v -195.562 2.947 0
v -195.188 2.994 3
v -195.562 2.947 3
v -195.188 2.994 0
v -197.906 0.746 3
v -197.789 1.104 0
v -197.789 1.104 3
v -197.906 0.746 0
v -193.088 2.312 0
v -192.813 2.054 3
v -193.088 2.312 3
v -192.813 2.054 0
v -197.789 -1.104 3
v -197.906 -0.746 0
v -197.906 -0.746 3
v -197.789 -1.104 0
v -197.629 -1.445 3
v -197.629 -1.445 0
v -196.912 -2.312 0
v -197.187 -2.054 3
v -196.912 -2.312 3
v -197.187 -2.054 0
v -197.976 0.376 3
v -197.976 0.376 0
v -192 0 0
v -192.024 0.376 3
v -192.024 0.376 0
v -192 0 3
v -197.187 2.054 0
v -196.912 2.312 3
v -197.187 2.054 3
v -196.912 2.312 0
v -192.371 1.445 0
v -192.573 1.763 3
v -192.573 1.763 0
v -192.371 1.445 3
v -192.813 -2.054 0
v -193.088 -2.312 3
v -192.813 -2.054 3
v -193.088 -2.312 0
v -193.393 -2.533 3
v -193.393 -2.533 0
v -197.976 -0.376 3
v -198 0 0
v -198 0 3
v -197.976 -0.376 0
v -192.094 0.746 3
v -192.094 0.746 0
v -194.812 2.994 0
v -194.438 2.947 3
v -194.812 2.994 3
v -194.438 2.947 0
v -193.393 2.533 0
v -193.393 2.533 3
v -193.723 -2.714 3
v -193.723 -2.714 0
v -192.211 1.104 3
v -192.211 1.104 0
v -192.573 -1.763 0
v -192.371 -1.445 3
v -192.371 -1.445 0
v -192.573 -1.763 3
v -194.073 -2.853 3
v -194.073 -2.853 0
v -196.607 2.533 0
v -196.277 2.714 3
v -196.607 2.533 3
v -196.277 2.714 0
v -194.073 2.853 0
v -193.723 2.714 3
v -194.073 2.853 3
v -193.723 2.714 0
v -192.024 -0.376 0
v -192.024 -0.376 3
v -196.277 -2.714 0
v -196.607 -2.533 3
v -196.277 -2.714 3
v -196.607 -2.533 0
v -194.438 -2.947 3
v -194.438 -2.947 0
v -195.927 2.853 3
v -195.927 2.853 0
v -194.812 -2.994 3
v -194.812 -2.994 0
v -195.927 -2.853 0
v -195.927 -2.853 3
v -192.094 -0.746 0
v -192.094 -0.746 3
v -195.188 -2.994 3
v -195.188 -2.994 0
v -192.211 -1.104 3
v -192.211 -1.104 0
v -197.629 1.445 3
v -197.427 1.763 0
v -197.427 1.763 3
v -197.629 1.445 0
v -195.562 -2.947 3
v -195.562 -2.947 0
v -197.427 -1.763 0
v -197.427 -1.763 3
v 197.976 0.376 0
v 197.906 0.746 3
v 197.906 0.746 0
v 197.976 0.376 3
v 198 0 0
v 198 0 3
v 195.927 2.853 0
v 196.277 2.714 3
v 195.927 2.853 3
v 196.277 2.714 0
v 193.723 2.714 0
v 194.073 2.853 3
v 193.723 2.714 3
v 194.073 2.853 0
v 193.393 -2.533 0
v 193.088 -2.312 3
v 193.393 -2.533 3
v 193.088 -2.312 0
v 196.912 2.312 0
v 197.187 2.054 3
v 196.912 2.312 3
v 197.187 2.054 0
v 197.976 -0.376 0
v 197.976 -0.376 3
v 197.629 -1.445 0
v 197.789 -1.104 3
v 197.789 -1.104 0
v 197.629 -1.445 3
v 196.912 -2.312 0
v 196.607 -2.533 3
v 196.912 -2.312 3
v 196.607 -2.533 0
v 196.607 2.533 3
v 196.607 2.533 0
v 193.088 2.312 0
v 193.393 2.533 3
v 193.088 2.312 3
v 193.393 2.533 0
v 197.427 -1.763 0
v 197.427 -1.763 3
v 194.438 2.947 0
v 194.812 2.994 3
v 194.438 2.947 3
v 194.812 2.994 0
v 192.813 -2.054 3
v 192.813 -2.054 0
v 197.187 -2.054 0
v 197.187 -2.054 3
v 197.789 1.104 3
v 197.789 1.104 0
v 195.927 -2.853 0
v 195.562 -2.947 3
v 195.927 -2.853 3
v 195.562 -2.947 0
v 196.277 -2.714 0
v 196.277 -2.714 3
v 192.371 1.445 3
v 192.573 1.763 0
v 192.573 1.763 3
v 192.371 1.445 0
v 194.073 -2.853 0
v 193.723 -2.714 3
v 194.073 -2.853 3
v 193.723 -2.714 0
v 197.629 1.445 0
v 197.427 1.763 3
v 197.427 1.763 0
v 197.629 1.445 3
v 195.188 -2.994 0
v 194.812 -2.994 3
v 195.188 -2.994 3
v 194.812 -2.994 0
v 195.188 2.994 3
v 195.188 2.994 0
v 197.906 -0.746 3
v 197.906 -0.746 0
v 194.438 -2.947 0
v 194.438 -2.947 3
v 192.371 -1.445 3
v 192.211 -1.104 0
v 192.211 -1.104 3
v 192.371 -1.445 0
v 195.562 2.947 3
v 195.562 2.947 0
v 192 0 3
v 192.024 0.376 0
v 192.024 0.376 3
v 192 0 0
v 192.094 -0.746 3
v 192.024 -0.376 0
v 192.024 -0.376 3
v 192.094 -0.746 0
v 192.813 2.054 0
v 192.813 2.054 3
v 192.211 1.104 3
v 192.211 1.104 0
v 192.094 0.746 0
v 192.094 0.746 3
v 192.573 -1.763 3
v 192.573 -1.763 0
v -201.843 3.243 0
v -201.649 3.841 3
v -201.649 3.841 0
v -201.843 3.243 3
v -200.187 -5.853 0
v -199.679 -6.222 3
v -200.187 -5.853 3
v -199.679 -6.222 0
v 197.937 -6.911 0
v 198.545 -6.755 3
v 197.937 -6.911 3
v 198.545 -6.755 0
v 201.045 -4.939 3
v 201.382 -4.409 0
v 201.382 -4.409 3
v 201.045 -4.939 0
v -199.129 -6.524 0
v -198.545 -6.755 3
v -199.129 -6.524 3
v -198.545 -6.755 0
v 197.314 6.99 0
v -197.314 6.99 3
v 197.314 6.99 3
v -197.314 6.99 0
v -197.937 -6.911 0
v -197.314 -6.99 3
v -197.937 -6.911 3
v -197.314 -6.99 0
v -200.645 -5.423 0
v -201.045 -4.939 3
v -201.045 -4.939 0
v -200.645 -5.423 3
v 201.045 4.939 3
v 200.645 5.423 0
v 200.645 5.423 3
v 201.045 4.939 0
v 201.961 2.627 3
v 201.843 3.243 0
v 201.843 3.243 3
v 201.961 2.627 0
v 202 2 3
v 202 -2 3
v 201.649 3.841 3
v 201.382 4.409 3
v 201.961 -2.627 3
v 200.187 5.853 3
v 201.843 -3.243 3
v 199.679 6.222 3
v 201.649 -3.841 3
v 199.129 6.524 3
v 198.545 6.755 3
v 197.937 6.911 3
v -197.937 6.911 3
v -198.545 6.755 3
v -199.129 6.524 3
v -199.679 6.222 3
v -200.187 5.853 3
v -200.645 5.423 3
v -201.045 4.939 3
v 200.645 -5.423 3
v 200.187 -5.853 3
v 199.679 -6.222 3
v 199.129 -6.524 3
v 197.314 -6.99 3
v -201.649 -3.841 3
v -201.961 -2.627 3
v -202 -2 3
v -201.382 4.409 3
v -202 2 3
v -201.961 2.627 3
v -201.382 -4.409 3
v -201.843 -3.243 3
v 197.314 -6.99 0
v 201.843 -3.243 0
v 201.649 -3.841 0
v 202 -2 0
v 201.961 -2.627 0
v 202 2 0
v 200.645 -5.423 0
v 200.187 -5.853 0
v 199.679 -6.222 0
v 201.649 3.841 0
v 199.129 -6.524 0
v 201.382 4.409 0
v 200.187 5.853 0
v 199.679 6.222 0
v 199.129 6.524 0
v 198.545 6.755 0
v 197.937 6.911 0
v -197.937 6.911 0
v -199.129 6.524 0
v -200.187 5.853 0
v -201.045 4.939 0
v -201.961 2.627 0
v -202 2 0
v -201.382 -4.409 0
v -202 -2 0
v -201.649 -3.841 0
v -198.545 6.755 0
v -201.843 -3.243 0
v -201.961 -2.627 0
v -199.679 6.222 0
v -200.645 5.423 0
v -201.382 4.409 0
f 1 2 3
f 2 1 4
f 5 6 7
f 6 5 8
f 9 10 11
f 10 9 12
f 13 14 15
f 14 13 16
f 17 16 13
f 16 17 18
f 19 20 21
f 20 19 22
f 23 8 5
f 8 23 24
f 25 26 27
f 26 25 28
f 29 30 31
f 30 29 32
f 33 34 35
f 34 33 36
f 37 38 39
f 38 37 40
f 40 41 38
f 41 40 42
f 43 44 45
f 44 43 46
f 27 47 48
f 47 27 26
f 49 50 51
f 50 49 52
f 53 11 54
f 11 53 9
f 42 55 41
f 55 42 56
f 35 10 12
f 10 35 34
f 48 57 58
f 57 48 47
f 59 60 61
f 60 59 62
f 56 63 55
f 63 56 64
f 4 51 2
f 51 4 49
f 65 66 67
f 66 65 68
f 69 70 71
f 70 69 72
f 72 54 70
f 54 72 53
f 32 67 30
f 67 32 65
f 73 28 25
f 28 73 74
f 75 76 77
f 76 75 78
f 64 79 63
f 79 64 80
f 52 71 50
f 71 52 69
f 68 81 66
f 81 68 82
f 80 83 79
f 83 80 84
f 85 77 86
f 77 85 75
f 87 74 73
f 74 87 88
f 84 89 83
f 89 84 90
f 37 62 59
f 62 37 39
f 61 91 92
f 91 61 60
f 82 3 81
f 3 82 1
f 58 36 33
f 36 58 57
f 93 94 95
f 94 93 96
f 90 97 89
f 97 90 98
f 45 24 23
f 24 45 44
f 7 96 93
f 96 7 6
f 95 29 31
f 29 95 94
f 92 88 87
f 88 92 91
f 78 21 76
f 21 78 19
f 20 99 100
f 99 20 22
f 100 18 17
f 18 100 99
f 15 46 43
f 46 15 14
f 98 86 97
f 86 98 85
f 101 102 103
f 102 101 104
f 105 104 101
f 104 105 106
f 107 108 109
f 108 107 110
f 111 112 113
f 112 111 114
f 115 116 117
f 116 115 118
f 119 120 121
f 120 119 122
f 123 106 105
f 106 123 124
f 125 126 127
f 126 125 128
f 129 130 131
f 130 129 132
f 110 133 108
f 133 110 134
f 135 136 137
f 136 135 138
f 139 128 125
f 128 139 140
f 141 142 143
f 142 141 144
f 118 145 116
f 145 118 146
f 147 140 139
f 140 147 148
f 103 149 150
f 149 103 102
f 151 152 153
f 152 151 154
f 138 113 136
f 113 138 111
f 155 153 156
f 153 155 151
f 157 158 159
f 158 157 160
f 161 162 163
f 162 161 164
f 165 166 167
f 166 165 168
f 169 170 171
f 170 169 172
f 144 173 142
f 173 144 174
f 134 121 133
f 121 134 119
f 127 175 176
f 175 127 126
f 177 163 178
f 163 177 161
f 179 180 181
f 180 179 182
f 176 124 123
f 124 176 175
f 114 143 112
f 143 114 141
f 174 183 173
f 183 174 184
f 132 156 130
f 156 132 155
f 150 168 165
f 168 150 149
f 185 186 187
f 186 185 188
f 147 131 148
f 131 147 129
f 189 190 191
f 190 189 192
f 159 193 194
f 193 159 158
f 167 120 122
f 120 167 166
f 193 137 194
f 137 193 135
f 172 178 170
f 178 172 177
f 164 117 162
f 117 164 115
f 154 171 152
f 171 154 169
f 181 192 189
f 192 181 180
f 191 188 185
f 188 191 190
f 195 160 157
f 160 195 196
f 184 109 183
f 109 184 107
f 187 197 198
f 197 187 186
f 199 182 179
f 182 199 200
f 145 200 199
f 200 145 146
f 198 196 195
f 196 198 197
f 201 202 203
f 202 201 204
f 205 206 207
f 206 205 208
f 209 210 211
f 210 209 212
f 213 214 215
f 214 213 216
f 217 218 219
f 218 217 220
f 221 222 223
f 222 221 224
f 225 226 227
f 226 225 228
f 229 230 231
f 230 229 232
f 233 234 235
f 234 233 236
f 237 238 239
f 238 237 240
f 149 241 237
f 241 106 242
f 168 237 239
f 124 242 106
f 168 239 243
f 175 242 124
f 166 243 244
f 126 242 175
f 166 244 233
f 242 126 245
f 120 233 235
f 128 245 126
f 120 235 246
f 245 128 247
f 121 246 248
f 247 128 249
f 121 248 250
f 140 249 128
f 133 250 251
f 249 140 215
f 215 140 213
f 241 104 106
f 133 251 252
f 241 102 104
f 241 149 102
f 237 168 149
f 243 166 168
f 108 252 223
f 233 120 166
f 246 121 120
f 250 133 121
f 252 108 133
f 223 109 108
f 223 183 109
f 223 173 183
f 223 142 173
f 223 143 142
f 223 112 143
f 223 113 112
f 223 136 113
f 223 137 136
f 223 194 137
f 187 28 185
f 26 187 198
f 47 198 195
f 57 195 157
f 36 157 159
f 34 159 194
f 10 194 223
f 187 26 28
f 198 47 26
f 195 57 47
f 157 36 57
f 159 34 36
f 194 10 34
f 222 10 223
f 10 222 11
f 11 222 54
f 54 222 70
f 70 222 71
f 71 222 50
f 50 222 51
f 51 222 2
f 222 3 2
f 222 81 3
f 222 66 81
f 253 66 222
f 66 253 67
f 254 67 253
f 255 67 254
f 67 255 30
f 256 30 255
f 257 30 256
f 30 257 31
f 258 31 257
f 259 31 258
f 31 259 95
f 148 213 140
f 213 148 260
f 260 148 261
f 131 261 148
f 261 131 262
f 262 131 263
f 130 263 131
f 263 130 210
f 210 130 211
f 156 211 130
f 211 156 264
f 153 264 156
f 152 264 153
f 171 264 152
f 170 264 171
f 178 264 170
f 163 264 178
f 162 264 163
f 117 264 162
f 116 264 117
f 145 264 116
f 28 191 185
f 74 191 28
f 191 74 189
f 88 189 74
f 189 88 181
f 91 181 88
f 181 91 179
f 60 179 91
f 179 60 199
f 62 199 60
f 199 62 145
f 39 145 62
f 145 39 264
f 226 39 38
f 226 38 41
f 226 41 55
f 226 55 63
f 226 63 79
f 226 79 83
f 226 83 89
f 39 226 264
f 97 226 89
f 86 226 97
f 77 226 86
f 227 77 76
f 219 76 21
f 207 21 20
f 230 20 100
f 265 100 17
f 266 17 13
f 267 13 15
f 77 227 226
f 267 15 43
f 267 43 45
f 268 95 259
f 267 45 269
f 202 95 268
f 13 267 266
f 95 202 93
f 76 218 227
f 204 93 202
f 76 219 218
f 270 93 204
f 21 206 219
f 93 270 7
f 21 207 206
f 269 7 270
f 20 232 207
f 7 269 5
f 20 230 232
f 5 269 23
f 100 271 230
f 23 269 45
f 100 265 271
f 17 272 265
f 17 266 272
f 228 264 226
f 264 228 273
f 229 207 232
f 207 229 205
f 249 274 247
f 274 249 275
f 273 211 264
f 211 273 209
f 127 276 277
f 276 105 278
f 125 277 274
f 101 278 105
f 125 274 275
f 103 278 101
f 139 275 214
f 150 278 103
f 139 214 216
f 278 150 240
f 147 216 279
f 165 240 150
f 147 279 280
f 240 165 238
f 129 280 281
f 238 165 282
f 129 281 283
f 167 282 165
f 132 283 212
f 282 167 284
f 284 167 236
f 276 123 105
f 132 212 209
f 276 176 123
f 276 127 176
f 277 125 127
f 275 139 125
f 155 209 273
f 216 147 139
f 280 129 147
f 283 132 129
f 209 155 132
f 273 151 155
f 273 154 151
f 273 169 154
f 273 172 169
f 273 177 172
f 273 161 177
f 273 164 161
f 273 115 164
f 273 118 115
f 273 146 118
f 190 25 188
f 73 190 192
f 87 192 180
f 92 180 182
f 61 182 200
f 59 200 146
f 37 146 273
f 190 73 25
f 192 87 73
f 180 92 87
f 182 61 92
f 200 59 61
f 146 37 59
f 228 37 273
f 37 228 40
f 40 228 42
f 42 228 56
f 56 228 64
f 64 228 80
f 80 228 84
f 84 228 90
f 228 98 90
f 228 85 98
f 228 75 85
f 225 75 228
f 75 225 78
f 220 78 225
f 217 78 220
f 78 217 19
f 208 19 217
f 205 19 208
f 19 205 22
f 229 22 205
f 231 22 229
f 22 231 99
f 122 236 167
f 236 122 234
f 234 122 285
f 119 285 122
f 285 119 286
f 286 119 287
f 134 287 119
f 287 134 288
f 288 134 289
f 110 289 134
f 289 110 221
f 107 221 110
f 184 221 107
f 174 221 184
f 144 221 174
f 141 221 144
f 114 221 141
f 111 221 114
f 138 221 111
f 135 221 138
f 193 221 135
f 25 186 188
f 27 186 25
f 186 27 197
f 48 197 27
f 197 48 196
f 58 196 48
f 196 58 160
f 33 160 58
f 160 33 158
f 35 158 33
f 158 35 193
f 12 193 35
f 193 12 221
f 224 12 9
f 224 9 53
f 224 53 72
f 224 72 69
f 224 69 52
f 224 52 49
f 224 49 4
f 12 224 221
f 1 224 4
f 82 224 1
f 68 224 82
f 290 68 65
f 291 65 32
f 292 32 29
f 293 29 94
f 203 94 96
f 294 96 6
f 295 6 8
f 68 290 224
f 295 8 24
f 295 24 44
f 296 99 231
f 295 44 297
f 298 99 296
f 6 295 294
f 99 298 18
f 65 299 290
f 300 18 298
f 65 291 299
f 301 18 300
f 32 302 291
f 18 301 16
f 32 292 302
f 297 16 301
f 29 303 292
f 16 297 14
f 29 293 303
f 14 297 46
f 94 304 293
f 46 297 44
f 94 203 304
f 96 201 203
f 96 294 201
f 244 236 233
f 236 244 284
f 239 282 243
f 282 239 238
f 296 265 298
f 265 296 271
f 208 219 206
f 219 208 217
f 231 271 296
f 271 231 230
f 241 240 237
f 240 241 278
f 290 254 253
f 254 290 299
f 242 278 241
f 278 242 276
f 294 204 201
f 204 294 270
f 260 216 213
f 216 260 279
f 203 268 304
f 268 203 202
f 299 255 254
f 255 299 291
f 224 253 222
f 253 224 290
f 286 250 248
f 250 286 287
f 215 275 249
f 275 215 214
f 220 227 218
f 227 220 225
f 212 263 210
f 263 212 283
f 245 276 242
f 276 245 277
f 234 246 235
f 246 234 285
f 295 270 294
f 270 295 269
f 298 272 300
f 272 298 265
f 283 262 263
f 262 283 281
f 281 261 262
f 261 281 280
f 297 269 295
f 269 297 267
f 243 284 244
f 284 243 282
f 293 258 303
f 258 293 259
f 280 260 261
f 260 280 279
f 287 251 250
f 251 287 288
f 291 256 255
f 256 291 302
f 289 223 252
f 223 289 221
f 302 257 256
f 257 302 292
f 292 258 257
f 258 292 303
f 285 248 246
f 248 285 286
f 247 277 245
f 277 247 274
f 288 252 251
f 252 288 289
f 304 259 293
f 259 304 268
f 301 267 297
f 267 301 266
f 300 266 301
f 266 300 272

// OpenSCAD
$fn = 50;


difference() {
	union() {
		hull() {
			translate(v = [-197.0000000000, 2.0000000000, 0]) {
				cylinder(h = 3, r = 5);
			}
			translate(v = [197.0000000000, 2.0000000000, 0]) {
				cylinder(h = 3, r = 5);
			}
			translate(v = [-197.0000000000, -2.0000000000, 0]) {
				cylinder(h = 3, r = 5);
			}
			translate(v = [197.0000000000, -2.0000000000, 0]) {
				cylinder(h = 3, r = 5);
			}
		}
	}
	union() {
		translate(v = [-195.0000000000, 0.0000000000, -100.0000000000]) {
			cylinder(h = 200, r = 3.0000000000);
		}
		translate(v = [-195.0000000000, 0.0000000000, -100.0000000000]) {
			cylinder(h = 200, r = 3.0000000000);
		}
		translate(v = [195.0000000000, 0.0000000000, -100.0000000000]) {
			cylinder(h = 200, r = 3.0000000000);
		}
		translate(v = [195.0000000000, 0.0000000000, -100.0000000000]) {
			cylinder(h = 200, r = 3.0000000000);
		}
	}
}
